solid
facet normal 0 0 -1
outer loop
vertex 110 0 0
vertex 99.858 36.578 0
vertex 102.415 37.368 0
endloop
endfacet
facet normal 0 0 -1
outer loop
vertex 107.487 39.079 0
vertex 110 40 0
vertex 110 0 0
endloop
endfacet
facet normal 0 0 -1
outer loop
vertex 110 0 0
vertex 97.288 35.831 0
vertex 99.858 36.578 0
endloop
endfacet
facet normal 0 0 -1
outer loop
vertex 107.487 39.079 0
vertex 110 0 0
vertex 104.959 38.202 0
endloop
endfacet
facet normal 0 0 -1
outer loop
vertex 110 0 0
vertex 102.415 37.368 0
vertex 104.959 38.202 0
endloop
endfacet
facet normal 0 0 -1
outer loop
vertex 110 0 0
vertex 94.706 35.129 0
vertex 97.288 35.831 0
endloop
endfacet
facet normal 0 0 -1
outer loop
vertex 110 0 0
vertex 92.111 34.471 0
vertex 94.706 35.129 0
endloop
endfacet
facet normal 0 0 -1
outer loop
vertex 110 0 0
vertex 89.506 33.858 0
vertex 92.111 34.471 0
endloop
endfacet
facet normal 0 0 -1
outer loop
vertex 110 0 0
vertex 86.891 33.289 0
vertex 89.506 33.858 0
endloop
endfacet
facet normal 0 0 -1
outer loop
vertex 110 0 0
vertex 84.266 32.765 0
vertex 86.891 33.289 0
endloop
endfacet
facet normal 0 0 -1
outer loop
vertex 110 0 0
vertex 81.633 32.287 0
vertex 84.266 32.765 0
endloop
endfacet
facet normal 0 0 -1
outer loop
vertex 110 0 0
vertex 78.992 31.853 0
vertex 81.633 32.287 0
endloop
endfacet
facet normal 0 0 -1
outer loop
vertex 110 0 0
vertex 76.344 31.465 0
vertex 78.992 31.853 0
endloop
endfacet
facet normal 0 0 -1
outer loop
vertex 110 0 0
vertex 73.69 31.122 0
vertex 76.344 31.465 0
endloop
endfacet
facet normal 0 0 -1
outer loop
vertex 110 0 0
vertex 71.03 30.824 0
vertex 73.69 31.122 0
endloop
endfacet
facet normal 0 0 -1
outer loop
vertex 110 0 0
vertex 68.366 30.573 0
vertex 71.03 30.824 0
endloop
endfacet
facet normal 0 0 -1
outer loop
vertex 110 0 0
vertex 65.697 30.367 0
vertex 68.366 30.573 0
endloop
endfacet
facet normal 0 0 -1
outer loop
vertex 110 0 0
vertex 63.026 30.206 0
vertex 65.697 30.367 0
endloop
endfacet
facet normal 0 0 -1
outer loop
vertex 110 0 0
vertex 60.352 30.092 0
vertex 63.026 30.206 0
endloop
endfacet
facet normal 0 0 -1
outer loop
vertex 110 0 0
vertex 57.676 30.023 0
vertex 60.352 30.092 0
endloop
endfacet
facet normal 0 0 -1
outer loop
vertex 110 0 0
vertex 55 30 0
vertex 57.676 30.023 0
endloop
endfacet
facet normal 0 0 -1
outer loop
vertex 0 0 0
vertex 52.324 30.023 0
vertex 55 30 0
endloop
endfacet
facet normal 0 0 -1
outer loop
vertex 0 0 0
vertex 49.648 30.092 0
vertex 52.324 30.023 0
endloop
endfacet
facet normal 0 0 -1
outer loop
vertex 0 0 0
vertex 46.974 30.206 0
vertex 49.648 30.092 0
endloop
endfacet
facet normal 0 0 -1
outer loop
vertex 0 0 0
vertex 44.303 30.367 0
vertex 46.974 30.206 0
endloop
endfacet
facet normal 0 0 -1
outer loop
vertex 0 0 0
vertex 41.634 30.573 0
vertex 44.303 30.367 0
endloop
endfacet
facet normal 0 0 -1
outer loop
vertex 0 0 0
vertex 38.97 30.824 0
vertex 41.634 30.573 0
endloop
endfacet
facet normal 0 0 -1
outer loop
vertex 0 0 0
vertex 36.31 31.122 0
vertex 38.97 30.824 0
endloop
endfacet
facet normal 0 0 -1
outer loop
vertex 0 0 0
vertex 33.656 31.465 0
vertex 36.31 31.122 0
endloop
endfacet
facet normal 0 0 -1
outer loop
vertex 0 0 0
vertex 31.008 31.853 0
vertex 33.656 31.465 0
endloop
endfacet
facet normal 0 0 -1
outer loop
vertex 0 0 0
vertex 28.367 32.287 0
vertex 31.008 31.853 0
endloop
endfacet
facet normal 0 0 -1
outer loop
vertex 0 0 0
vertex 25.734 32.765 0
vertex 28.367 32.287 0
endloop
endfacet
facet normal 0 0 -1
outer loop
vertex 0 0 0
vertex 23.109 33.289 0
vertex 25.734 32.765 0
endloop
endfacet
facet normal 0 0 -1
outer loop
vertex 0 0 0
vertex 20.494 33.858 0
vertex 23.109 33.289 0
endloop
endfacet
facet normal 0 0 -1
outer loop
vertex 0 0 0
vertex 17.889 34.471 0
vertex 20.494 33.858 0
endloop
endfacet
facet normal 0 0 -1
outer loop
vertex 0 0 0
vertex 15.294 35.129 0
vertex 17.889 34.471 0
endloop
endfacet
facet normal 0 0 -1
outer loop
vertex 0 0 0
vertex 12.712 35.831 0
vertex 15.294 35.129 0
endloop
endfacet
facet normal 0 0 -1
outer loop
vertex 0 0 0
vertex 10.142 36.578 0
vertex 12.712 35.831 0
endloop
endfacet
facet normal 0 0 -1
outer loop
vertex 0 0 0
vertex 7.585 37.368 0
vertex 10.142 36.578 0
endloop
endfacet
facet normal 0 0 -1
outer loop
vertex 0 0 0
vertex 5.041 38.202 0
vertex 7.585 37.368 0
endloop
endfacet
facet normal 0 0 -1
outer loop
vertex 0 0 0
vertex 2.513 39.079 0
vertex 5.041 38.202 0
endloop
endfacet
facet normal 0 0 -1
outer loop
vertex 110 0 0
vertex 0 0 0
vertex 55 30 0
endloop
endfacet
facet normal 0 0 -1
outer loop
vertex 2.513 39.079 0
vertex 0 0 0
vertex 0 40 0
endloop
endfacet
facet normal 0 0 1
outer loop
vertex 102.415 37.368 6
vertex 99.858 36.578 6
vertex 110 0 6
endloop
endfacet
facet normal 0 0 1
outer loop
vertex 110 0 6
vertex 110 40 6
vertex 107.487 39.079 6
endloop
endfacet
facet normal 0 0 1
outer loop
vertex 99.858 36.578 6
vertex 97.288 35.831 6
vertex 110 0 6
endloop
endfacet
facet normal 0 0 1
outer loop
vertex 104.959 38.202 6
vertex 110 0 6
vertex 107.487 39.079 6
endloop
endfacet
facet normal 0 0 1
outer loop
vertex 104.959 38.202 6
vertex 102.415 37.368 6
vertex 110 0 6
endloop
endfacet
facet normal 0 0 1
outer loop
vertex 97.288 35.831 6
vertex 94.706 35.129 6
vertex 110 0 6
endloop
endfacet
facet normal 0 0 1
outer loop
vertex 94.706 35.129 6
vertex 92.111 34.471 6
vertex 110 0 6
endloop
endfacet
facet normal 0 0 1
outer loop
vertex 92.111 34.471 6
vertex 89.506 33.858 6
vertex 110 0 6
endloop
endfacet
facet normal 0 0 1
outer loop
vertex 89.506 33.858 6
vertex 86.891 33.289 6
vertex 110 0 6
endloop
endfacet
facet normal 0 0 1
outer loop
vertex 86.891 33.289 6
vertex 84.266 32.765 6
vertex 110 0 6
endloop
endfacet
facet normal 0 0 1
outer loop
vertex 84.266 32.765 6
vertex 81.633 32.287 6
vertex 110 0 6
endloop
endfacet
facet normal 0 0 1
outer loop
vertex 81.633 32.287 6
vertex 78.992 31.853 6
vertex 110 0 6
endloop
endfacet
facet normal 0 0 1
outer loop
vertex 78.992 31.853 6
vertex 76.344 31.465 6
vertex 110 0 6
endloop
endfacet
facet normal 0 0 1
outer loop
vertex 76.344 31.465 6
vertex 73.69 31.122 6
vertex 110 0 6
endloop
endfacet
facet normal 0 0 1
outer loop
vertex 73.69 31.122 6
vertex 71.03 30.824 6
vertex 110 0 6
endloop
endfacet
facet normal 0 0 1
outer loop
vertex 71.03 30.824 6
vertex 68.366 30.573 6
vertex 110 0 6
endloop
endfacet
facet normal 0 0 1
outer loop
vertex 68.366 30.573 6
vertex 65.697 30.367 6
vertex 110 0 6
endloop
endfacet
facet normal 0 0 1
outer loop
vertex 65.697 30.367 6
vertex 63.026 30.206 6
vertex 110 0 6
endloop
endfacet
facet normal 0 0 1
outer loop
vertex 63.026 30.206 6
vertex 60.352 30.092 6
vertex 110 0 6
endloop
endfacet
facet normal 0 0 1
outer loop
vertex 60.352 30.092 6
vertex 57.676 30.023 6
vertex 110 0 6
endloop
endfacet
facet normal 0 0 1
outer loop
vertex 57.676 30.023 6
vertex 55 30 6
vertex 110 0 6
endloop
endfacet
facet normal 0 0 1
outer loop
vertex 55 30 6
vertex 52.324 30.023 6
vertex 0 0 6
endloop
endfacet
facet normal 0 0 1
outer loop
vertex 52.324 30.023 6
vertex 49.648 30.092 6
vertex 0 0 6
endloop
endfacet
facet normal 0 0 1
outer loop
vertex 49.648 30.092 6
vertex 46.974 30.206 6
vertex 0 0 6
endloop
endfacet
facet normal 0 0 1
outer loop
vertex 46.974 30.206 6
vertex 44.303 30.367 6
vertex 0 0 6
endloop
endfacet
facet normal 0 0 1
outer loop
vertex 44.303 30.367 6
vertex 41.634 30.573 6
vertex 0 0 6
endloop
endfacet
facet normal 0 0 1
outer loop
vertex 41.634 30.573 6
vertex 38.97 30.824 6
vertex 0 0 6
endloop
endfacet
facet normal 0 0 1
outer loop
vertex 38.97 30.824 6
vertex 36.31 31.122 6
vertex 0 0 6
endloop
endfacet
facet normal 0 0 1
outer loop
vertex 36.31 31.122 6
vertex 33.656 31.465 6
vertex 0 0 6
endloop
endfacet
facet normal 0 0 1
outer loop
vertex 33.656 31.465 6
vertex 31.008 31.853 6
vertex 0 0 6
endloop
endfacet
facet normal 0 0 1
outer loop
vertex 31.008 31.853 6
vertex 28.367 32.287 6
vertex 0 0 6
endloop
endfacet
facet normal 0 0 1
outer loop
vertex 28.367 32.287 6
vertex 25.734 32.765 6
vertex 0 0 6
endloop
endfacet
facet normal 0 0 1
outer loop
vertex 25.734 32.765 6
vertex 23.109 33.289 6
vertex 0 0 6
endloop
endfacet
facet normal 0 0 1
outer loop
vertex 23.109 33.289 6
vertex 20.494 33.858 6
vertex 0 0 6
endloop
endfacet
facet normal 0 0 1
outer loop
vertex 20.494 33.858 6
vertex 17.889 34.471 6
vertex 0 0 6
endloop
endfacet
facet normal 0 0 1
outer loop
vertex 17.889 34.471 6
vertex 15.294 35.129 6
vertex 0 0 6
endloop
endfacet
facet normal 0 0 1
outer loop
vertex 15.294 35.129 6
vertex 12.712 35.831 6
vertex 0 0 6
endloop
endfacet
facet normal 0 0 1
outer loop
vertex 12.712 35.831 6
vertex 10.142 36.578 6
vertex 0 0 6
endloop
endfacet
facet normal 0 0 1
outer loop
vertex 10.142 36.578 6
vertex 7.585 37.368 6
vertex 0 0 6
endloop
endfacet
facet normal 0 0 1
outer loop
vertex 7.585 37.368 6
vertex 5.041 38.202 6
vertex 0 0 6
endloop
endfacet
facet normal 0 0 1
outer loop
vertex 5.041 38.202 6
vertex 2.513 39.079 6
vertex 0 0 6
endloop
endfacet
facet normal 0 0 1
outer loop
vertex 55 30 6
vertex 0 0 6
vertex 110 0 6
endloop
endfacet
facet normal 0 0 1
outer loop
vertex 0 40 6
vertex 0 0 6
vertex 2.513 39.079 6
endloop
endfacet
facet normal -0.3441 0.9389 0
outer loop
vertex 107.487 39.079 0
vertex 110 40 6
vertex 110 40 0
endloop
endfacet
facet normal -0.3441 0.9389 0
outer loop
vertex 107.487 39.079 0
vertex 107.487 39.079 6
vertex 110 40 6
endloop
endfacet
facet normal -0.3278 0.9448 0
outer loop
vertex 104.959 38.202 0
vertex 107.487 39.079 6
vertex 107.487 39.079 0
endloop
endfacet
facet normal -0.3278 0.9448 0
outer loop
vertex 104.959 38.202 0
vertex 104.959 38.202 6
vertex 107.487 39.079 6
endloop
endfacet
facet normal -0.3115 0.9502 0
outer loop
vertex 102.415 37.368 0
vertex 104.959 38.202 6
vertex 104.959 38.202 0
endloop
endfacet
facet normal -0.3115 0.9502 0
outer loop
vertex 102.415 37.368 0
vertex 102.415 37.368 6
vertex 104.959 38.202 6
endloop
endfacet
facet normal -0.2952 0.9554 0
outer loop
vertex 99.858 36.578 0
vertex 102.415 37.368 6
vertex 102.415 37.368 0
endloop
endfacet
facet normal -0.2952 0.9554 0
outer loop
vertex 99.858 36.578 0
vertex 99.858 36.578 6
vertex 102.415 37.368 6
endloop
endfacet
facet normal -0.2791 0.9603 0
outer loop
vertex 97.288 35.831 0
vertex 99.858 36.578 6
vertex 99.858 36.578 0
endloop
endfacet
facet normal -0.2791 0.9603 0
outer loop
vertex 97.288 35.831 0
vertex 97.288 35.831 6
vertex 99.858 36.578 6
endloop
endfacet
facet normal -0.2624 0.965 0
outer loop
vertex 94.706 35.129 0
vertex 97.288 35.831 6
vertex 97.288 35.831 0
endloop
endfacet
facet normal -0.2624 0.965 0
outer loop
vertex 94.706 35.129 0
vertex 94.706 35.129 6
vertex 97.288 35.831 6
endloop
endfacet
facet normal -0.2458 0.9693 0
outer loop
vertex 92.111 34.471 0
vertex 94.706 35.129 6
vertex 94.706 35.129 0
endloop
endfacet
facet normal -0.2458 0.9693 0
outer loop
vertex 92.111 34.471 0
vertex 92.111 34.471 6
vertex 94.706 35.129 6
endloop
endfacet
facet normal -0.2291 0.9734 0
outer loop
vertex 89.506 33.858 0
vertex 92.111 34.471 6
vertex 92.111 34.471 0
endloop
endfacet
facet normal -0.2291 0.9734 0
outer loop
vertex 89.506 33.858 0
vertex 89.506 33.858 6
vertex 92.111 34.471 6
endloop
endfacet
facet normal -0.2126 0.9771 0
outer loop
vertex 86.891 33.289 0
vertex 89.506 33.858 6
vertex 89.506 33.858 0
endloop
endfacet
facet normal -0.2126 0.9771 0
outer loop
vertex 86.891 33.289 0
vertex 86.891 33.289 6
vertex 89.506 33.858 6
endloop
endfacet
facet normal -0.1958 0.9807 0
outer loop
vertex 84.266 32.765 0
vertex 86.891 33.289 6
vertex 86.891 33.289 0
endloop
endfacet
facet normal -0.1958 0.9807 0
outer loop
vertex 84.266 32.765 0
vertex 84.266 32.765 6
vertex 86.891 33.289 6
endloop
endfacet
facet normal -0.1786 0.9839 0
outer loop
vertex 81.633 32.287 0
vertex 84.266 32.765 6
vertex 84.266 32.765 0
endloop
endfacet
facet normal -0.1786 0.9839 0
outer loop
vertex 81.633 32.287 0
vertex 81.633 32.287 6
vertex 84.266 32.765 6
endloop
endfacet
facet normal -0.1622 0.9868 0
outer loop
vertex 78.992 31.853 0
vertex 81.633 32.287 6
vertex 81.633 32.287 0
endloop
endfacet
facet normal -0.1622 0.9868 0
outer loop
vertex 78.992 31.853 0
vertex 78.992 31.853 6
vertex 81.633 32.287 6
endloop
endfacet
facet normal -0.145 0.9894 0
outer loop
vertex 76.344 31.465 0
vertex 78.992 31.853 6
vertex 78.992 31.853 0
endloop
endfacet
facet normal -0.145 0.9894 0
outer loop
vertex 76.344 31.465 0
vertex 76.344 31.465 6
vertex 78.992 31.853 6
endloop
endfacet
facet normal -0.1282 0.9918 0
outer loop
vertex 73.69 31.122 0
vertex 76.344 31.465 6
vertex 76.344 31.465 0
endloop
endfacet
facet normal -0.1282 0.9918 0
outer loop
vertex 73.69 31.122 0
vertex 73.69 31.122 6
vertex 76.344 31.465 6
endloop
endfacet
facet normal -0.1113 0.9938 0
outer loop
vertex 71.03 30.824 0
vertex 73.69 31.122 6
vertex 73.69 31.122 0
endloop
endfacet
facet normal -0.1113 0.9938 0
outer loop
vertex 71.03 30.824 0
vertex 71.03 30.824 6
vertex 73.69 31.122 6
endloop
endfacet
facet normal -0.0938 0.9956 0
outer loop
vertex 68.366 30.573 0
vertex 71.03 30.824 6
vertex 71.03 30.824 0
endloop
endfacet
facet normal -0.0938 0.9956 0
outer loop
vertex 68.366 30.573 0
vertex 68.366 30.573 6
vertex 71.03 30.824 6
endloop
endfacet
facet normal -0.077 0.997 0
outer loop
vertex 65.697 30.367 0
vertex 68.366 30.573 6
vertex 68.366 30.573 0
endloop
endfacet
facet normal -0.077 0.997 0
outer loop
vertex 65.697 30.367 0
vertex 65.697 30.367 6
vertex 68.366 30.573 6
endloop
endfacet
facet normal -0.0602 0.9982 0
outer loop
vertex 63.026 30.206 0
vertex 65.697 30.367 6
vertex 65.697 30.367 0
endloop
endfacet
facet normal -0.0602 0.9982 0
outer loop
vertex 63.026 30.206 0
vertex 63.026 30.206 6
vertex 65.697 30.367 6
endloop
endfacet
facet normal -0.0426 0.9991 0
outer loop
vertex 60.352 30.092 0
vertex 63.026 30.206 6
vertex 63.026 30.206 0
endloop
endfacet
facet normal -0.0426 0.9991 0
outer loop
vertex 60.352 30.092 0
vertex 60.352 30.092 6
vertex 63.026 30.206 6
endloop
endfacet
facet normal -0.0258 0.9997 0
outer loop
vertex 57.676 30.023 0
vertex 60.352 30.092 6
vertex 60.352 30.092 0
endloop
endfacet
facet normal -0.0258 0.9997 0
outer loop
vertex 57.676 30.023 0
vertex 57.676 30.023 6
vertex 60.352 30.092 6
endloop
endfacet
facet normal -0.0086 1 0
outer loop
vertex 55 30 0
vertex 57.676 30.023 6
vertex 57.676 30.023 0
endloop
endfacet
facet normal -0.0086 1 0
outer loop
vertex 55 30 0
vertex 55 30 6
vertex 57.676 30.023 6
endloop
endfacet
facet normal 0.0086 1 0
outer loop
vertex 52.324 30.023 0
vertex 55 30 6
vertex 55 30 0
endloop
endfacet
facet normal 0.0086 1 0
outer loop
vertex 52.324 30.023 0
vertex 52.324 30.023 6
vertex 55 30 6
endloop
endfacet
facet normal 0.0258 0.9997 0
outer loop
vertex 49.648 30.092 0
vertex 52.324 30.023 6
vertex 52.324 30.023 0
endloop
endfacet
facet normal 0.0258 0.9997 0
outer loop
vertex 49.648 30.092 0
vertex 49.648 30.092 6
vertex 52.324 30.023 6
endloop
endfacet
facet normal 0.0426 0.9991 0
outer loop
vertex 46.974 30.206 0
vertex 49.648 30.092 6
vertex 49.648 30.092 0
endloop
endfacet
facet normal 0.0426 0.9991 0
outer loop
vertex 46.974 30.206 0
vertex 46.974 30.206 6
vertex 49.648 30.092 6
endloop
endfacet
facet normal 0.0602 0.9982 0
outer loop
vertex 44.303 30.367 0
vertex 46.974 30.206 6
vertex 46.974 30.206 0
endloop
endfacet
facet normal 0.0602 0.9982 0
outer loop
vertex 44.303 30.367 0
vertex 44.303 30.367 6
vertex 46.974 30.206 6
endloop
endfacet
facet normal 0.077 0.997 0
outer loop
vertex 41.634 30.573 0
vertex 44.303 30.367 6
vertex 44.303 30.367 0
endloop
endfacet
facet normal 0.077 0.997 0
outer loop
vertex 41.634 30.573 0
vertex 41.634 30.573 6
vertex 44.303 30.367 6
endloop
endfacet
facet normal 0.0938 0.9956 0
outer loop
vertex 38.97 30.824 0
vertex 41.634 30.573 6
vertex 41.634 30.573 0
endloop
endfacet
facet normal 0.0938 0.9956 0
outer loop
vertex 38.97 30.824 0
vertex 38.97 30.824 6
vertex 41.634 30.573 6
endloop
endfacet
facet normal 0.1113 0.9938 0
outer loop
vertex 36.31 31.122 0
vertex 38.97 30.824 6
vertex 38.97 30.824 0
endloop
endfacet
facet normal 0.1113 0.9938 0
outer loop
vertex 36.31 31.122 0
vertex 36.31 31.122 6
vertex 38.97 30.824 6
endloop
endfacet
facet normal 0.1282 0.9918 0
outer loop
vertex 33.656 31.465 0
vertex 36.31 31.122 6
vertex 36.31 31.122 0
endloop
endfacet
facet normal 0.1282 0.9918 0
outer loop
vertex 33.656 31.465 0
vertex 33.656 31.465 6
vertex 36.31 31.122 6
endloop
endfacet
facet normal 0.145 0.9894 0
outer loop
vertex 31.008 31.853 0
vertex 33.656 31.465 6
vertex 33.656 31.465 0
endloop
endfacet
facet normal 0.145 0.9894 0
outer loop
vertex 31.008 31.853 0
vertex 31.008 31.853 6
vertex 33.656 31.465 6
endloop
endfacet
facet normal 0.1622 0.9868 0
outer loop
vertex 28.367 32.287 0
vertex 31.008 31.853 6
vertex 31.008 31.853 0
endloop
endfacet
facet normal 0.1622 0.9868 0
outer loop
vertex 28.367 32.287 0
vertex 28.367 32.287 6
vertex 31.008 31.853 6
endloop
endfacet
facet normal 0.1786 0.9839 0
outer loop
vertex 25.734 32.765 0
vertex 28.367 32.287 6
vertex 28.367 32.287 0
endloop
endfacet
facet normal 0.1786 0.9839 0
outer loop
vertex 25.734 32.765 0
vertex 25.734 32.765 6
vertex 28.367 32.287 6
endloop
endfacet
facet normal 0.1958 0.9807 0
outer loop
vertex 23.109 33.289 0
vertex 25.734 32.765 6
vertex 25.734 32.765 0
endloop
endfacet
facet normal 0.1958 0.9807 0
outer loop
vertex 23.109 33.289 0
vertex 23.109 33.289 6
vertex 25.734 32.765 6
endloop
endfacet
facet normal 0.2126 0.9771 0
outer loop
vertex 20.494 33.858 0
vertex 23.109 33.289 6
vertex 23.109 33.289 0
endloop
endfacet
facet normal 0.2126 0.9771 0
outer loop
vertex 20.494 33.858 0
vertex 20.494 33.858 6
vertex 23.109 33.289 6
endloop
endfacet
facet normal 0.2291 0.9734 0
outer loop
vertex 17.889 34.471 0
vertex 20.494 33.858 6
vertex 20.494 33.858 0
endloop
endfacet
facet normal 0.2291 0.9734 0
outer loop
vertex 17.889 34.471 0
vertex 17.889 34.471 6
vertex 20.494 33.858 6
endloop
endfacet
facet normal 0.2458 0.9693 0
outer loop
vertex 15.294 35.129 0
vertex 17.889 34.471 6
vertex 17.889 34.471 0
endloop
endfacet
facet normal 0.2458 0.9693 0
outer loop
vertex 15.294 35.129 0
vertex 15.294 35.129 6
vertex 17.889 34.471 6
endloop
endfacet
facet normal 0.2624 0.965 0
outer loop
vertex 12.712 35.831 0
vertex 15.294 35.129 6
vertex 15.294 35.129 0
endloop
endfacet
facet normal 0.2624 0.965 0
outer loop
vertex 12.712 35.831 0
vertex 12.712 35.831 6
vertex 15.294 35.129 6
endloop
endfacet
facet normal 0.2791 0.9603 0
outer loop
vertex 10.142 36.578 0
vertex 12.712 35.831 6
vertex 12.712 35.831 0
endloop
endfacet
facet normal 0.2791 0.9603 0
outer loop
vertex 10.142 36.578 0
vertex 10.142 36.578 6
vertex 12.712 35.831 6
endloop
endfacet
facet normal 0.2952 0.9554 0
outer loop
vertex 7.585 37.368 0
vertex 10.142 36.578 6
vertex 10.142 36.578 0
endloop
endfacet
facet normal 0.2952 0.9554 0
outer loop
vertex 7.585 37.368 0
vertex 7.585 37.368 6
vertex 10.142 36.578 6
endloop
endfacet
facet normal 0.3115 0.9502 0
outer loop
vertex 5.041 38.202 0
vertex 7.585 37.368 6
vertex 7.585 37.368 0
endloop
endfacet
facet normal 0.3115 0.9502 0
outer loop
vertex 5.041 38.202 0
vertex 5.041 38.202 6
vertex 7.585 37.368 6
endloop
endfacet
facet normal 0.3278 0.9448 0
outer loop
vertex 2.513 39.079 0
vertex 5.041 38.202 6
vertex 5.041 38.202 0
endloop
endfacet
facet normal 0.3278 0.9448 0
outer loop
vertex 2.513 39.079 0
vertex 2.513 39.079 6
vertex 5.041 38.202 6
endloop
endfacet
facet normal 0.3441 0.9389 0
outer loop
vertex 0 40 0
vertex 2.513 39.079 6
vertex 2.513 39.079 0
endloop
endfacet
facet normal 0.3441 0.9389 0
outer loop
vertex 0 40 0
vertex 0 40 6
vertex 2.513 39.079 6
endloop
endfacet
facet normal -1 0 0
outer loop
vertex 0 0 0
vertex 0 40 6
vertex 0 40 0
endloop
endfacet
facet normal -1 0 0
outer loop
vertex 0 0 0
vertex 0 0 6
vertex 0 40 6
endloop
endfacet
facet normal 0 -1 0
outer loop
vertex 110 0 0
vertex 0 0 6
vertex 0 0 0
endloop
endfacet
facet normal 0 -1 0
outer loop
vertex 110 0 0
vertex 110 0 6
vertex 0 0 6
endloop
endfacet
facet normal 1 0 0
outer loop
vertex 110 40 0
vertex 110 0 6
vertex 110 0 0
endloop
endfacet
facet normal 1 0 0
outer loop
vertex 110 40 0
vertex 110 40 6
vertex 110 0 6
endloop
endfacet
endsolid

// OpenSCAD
$fn = 32;

// ----------------------------------------------------------------------
// Arc profile plate: notch, 45 points
// ----------------------------------------------------------------------

// --- parameters (mm) ---
bar_l = 110;              // bar length, X
bar_w = 40;               // bar width, Y
notch_depth = 10;         // depth of the arc notch at mid-span
arc_r = 156.25;           // radius of the notch arc
arc_angle = 41.22;        // notch arc angle, degrees
arc_step = 1;             // sampling step of the notch arc, degrees
plate_t = 6;              // plate thickness, Z

profile = [[0, 0], [110, 0], [110, 40], [107.487, 39.079], [104.959, 38.202], [102.415, 37.368], [99.858, 36.578], [97.288, 35.831], [94.706, 35.129], [92.111, 34.471], [89.506, 33.858], [86.891, 33.289], [84.266, 32.765], [81.633, 32.287], [78.992, 31.853], [76.344, 31.465], [73.69, 31.122], [71.03, 30.824], [68.366, 30.573], [65.697, 30.367], [63.026, 30.206], [60.352, 30.092], [57.676, 30.023], [55, 30], [52.324, 30.023], [49.648, 30.092], [46.974, 30.206], [44.303, 30.367], [41.634, 30.573], [38.97, 30.824], [36.31, 31.122], [33.656, 31.465], [31.008, 31.853], [28.367, 32.287], [25.734, 32.765], [23.109, 33.289], [20.494, 33.858], [17.889, 34.471], [15.294, 35.129], [12.712, 35.831], [10.142, 36.578], [7.585, 37.368], [5.041, 38.202], [2.513, 39.079], [0, 40]];  // primary outline, 45 points, counter clockwise

// --- the one profile operation ---
linear_extrude(height = plate_t) polygon(points = profile);
